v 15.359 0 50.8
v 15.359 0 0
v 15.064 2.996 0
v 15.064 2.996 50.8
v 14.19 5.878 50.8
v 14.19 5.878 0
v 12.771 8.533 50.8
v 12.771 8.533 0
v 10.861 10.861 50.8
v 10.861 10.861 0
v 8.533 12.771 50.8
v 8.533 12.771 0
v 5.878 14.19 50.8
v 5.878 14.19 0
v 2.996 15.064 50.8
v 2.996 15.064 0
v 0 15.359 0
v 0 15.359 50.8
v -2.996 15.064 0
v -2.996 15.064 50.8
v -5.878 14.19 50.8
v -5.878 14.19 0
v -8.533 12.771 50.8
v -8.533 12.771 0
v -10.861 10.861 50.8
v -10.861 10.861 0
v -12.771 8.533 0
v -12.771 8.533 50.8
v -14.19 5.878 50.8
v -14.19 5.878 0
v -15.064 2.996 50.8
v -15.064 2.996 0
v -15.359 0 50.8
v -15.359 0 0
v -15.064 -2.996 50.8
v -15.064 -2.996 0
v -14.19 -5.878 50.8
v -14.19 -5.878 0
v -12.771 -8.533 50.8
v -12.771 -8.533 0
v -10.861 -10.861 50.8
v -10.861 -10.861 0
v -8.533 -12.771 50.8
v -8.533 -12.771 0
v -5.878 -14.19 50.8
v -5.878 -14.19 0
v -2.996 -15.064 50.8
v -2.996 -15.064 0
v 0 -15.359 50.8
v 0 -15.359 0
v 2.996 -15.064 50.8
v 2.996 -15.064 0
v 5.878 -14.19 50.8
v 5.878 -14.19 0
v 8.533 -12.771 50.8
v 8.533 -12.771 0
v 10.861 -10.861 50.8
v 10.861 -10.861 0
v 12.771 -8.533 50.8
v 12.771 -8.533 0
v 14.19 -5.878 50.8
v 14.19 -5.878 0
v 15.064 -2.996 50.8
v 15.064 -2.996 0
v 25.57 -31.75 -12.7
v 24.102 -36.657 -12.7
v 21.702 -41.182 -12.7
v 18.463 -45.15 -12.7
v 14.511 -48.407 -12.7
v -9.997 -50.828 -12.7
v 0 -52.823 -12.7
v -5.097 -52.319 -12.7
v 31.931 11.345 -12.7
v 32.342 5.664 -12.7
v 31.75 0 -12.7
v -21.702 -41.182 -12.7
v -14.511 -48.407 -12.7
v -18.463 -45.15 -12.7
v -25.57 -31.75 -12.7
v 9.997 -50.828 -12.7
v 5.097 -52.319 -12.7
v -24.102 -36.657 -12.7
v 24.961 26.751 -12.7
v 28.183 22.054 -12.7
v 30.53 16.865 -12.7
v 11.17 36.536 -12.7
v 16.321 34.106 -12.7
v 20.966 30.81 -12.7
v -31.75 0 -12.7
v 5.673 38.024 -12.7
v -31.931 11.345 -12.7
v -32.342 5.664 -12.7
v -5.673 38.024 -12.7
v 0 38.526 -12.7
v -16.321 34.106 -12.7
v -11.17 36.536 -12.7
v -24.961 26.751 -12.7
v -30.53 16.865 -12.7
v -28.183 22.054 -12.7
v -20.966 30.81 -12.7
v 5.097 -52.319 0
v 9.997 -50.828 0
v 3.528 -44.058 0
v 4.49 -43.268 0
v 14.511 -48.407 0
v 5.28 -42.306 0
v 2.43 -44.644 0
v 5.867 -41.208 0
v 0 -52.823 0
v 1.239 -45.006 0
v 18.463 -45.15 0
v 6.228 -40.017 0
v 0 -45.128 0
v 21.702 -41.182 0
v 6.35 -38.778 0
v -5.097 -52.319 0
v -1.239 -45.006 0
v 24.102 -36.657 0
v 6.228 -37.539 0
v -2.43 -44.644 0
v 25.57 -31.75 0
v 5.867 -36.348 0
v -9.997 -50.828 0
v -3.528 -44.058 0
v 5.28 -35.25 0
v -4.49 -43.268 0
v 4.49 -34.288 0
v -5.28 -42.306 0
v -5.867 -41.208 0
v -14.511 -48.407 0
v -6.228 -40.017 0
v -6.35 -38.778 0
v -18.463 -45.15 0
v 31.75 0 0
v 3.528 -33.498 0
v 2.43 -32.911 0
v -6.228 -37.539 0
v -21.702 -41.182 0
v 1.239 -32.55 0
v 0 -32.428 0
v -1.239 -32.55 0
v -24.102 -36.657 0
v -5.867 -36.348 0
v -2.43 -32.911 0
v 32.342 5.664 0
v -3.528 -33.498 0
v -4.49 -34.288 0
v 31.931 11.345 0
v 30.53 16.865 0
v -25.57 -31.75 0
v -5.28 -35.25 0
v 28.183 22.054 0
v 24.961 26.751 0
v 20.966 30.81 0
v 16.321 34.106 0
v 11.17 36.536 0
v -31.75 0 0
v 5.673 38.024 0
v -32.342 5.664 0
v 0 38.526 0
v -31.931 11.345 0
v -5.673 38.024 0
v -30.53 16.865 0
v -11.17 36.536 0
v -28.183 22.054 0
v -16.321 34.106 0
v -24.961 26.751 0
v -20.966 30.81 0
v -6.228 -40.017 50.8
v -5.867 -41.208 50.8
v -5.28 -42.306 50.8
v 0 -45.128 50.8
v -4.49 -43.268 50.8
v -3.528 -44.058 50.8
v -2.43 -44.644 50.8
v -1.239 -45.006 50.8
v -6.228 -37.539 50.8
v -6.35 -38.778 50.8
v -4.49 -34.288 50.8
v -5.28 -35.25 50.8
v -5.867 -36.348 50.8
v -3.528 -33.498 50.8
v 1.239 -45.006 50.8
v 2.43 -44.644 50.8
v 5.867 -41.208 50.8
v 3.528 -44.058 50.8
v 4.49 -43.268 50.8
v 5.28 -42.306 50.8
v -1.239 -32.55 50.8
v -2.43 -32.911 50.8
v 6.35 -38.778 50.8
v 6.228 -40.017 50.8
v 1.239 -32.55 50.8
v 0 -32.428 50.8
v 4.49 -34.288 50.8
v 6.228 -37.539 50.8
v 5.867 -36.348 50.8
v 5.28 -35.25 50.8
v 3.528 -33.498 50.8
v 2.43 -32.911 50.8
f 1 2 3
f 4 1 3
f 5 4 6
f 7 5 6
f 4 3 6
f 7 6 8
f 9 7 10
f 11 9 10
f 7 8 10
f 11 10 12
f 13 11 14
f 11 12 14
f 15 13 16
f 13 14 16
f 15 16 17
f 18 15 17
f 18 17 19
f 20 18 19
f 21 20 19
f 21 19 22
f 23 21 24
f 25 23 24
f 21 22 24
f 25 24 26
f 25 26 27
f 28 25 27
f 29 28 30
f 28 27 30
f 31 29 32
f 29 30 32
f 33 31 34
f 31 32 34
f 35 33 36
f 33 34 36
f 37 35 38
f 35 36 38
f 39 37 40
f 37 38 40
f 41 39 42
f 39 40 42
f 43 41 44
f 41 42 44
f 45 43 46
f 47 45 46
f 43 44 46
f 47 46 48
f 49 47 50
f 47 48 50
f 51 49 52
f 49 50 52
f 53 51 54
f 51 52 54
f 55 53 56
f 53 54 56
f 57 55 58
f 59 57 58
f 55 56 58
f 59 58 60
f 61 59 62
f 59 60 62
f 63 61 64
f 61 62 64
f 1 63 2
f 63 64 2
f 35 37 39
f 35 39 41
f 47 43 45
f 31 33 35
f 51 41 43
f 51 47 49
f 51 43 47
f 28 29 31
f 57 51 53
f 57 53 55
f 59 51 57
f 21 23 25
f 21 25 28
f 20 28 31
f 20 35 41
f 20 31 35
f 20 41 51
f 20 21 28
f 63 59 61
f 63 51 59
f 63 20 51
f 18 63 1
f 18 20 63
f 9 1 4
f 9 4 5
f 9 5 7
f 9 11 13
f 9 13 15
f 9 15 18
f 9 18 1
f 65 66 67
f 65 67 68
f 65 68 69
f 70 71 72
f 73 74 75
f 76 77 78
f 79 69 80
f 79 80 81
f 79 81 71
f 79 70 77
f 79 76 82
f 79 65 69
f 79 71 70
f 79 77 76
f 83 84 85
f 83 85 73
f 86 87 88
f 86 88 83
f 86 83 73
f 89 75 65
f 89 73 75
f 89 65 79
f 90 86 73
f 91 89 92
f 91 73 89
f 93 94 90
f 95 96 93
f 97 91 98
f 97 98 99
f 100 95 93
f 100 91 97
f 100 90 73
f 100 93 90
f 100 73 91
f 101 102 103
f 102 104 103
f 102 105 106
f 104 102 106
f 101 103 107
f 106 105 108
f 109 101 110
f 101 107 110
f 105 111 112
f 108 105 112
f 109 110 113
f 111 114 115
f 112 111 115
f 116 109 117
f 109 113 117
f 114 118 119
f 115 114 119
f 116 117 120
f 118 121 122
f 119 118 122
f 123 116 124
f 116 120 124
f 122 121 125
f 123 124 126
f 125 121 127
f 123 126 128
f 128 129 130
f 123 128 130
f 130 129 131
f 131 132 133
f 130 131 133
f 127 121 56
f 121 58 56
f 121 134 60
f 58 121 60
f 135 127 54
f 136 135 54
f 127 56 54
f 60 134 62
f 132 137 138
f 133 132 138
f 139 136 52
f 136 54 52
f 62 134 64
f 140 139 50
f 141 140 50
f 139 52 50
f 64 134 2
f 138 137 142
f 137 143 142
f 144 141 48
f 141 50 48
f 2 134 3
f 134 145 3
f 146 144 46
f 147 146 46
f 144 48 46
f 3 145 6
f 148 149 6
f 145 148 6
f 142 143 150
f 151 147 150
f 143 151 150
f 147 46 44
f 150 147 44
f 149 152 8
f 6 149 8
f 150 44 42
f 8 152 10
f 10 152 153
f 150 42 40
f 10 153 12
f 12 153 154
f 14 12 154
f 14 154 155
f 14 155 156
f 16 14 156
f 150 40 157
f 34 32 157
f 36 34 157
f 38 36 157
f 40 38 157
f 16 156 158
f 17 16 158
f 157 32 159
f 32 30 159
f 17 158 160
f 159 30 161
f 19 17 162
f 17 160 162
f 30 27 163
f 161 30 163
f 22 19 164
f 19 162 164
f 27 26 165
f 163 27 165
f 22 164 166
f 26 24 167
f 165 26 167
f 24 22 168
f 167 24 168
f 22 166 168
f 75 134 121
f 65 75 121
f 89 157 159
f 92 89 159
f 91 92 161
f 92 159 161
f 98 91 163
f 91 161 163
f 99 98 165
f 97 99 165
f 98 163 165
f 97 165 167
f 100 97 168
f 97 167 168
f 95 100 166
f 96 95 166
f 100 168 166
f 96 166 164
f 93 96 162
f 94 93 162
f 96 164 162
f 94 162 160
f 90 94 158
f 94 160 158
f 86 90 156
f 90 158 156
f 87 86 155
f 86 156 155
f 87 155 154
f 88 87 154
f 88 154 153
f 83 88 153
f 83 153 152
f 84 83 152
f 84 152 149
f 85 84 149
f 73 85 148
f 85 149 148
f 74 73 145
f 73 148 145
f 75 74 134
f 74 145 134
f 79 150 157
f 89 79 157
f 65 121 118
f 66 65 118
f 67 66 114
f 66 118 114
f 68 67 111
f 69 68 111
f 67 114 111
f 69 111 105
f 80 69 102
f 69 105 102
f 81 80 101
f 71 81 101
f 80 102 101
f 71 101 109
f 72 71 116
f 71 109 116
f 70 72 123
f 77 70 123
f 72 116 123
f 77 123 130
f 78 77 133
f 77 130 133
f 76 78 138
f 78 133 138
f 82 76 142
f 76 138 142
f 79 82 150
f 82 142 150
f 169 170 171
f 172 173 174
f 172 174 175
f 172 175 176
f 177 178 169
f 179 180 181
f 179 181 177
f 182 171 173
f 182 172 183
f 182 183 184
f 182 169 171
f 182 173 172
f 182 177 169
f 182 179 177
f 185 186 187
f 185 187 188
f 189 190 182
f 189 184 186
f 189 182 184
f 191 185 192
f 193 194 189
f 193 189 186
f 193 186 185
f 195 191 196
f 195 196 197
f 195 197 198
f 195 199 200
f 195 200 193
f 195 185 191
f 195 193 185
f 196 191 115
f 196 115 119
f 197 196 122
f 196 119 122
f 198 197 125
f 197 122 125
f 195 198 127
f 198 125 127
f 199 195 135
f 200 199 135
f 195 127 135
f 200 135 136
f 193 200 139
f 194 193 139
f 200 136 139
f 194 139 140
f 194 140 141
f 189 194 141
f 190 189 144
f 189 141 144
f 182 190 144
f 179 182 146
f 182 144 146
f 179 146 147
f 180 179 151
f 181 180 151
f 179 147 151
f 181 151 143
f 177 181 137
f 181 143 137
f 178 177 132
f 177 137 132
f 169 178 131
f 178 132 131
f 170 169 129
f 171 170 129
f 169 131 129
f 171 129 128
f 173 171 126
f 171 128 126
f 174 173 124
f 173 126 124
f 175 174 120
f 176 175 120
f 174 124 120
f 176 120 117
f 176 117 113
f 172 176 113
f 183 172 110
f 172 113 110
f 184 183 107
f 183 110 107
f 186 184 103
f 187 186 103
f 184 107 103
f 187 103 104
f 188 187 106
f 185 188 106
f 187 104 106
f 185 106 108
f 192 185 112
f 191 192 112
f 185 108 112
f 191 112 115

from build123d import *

# Parameters (mm, degrees)
SKETCH1_R           = 15.359074057
BOSS_EXTRUDE1_DEPTH = 50.8
BOSS_EXTRUDE2_DEPTH = 12.7
SKETCH3_R           = 6.35
BOSS_EXTRUDE3_DEPTH = 50.8


with BuildPart() as part:
    # Sketch1 → Boss-Extrude1 (new body)
    with BuildSketch(Plane.XY):
        Circle(SKETCH1_R)
    extrude(amount=BOSS_EXTRUDE1_DEPTH)

    # Sketch2 → Boss-Extrude2 (add)
    with BuildSketch(Plane(origin=(0, 0, 0), x_dir=(-1, 0, 0), z_dir=(0, 0, -1))):
        with BuildLine():
            Line((-31.75, 0), (-25.57013776, -31.75))
            ThreePointArc((-25.57013776, -31.75), (0, -52.822994947), (25.57013776, -31.75))
            Line((25.57013776, -31.75), (31.75, 0))
            ThreePointArc((31.75, 0), (0, 38.525699643), (-31.75, 0))
        make_face()
    extrude(amount=BOSS_EXTRUDE2_DEPTH)

    # Sketch3 → Boss-Extrude3 (add)
    with BuildSketch(Plane.XY):
        with Locations((0, -38.777693264)):
            Circle(SKETCH3_R)
    extrude(amount=BOSS_EXTRUDE3_DEPTH)


solid = part.part
